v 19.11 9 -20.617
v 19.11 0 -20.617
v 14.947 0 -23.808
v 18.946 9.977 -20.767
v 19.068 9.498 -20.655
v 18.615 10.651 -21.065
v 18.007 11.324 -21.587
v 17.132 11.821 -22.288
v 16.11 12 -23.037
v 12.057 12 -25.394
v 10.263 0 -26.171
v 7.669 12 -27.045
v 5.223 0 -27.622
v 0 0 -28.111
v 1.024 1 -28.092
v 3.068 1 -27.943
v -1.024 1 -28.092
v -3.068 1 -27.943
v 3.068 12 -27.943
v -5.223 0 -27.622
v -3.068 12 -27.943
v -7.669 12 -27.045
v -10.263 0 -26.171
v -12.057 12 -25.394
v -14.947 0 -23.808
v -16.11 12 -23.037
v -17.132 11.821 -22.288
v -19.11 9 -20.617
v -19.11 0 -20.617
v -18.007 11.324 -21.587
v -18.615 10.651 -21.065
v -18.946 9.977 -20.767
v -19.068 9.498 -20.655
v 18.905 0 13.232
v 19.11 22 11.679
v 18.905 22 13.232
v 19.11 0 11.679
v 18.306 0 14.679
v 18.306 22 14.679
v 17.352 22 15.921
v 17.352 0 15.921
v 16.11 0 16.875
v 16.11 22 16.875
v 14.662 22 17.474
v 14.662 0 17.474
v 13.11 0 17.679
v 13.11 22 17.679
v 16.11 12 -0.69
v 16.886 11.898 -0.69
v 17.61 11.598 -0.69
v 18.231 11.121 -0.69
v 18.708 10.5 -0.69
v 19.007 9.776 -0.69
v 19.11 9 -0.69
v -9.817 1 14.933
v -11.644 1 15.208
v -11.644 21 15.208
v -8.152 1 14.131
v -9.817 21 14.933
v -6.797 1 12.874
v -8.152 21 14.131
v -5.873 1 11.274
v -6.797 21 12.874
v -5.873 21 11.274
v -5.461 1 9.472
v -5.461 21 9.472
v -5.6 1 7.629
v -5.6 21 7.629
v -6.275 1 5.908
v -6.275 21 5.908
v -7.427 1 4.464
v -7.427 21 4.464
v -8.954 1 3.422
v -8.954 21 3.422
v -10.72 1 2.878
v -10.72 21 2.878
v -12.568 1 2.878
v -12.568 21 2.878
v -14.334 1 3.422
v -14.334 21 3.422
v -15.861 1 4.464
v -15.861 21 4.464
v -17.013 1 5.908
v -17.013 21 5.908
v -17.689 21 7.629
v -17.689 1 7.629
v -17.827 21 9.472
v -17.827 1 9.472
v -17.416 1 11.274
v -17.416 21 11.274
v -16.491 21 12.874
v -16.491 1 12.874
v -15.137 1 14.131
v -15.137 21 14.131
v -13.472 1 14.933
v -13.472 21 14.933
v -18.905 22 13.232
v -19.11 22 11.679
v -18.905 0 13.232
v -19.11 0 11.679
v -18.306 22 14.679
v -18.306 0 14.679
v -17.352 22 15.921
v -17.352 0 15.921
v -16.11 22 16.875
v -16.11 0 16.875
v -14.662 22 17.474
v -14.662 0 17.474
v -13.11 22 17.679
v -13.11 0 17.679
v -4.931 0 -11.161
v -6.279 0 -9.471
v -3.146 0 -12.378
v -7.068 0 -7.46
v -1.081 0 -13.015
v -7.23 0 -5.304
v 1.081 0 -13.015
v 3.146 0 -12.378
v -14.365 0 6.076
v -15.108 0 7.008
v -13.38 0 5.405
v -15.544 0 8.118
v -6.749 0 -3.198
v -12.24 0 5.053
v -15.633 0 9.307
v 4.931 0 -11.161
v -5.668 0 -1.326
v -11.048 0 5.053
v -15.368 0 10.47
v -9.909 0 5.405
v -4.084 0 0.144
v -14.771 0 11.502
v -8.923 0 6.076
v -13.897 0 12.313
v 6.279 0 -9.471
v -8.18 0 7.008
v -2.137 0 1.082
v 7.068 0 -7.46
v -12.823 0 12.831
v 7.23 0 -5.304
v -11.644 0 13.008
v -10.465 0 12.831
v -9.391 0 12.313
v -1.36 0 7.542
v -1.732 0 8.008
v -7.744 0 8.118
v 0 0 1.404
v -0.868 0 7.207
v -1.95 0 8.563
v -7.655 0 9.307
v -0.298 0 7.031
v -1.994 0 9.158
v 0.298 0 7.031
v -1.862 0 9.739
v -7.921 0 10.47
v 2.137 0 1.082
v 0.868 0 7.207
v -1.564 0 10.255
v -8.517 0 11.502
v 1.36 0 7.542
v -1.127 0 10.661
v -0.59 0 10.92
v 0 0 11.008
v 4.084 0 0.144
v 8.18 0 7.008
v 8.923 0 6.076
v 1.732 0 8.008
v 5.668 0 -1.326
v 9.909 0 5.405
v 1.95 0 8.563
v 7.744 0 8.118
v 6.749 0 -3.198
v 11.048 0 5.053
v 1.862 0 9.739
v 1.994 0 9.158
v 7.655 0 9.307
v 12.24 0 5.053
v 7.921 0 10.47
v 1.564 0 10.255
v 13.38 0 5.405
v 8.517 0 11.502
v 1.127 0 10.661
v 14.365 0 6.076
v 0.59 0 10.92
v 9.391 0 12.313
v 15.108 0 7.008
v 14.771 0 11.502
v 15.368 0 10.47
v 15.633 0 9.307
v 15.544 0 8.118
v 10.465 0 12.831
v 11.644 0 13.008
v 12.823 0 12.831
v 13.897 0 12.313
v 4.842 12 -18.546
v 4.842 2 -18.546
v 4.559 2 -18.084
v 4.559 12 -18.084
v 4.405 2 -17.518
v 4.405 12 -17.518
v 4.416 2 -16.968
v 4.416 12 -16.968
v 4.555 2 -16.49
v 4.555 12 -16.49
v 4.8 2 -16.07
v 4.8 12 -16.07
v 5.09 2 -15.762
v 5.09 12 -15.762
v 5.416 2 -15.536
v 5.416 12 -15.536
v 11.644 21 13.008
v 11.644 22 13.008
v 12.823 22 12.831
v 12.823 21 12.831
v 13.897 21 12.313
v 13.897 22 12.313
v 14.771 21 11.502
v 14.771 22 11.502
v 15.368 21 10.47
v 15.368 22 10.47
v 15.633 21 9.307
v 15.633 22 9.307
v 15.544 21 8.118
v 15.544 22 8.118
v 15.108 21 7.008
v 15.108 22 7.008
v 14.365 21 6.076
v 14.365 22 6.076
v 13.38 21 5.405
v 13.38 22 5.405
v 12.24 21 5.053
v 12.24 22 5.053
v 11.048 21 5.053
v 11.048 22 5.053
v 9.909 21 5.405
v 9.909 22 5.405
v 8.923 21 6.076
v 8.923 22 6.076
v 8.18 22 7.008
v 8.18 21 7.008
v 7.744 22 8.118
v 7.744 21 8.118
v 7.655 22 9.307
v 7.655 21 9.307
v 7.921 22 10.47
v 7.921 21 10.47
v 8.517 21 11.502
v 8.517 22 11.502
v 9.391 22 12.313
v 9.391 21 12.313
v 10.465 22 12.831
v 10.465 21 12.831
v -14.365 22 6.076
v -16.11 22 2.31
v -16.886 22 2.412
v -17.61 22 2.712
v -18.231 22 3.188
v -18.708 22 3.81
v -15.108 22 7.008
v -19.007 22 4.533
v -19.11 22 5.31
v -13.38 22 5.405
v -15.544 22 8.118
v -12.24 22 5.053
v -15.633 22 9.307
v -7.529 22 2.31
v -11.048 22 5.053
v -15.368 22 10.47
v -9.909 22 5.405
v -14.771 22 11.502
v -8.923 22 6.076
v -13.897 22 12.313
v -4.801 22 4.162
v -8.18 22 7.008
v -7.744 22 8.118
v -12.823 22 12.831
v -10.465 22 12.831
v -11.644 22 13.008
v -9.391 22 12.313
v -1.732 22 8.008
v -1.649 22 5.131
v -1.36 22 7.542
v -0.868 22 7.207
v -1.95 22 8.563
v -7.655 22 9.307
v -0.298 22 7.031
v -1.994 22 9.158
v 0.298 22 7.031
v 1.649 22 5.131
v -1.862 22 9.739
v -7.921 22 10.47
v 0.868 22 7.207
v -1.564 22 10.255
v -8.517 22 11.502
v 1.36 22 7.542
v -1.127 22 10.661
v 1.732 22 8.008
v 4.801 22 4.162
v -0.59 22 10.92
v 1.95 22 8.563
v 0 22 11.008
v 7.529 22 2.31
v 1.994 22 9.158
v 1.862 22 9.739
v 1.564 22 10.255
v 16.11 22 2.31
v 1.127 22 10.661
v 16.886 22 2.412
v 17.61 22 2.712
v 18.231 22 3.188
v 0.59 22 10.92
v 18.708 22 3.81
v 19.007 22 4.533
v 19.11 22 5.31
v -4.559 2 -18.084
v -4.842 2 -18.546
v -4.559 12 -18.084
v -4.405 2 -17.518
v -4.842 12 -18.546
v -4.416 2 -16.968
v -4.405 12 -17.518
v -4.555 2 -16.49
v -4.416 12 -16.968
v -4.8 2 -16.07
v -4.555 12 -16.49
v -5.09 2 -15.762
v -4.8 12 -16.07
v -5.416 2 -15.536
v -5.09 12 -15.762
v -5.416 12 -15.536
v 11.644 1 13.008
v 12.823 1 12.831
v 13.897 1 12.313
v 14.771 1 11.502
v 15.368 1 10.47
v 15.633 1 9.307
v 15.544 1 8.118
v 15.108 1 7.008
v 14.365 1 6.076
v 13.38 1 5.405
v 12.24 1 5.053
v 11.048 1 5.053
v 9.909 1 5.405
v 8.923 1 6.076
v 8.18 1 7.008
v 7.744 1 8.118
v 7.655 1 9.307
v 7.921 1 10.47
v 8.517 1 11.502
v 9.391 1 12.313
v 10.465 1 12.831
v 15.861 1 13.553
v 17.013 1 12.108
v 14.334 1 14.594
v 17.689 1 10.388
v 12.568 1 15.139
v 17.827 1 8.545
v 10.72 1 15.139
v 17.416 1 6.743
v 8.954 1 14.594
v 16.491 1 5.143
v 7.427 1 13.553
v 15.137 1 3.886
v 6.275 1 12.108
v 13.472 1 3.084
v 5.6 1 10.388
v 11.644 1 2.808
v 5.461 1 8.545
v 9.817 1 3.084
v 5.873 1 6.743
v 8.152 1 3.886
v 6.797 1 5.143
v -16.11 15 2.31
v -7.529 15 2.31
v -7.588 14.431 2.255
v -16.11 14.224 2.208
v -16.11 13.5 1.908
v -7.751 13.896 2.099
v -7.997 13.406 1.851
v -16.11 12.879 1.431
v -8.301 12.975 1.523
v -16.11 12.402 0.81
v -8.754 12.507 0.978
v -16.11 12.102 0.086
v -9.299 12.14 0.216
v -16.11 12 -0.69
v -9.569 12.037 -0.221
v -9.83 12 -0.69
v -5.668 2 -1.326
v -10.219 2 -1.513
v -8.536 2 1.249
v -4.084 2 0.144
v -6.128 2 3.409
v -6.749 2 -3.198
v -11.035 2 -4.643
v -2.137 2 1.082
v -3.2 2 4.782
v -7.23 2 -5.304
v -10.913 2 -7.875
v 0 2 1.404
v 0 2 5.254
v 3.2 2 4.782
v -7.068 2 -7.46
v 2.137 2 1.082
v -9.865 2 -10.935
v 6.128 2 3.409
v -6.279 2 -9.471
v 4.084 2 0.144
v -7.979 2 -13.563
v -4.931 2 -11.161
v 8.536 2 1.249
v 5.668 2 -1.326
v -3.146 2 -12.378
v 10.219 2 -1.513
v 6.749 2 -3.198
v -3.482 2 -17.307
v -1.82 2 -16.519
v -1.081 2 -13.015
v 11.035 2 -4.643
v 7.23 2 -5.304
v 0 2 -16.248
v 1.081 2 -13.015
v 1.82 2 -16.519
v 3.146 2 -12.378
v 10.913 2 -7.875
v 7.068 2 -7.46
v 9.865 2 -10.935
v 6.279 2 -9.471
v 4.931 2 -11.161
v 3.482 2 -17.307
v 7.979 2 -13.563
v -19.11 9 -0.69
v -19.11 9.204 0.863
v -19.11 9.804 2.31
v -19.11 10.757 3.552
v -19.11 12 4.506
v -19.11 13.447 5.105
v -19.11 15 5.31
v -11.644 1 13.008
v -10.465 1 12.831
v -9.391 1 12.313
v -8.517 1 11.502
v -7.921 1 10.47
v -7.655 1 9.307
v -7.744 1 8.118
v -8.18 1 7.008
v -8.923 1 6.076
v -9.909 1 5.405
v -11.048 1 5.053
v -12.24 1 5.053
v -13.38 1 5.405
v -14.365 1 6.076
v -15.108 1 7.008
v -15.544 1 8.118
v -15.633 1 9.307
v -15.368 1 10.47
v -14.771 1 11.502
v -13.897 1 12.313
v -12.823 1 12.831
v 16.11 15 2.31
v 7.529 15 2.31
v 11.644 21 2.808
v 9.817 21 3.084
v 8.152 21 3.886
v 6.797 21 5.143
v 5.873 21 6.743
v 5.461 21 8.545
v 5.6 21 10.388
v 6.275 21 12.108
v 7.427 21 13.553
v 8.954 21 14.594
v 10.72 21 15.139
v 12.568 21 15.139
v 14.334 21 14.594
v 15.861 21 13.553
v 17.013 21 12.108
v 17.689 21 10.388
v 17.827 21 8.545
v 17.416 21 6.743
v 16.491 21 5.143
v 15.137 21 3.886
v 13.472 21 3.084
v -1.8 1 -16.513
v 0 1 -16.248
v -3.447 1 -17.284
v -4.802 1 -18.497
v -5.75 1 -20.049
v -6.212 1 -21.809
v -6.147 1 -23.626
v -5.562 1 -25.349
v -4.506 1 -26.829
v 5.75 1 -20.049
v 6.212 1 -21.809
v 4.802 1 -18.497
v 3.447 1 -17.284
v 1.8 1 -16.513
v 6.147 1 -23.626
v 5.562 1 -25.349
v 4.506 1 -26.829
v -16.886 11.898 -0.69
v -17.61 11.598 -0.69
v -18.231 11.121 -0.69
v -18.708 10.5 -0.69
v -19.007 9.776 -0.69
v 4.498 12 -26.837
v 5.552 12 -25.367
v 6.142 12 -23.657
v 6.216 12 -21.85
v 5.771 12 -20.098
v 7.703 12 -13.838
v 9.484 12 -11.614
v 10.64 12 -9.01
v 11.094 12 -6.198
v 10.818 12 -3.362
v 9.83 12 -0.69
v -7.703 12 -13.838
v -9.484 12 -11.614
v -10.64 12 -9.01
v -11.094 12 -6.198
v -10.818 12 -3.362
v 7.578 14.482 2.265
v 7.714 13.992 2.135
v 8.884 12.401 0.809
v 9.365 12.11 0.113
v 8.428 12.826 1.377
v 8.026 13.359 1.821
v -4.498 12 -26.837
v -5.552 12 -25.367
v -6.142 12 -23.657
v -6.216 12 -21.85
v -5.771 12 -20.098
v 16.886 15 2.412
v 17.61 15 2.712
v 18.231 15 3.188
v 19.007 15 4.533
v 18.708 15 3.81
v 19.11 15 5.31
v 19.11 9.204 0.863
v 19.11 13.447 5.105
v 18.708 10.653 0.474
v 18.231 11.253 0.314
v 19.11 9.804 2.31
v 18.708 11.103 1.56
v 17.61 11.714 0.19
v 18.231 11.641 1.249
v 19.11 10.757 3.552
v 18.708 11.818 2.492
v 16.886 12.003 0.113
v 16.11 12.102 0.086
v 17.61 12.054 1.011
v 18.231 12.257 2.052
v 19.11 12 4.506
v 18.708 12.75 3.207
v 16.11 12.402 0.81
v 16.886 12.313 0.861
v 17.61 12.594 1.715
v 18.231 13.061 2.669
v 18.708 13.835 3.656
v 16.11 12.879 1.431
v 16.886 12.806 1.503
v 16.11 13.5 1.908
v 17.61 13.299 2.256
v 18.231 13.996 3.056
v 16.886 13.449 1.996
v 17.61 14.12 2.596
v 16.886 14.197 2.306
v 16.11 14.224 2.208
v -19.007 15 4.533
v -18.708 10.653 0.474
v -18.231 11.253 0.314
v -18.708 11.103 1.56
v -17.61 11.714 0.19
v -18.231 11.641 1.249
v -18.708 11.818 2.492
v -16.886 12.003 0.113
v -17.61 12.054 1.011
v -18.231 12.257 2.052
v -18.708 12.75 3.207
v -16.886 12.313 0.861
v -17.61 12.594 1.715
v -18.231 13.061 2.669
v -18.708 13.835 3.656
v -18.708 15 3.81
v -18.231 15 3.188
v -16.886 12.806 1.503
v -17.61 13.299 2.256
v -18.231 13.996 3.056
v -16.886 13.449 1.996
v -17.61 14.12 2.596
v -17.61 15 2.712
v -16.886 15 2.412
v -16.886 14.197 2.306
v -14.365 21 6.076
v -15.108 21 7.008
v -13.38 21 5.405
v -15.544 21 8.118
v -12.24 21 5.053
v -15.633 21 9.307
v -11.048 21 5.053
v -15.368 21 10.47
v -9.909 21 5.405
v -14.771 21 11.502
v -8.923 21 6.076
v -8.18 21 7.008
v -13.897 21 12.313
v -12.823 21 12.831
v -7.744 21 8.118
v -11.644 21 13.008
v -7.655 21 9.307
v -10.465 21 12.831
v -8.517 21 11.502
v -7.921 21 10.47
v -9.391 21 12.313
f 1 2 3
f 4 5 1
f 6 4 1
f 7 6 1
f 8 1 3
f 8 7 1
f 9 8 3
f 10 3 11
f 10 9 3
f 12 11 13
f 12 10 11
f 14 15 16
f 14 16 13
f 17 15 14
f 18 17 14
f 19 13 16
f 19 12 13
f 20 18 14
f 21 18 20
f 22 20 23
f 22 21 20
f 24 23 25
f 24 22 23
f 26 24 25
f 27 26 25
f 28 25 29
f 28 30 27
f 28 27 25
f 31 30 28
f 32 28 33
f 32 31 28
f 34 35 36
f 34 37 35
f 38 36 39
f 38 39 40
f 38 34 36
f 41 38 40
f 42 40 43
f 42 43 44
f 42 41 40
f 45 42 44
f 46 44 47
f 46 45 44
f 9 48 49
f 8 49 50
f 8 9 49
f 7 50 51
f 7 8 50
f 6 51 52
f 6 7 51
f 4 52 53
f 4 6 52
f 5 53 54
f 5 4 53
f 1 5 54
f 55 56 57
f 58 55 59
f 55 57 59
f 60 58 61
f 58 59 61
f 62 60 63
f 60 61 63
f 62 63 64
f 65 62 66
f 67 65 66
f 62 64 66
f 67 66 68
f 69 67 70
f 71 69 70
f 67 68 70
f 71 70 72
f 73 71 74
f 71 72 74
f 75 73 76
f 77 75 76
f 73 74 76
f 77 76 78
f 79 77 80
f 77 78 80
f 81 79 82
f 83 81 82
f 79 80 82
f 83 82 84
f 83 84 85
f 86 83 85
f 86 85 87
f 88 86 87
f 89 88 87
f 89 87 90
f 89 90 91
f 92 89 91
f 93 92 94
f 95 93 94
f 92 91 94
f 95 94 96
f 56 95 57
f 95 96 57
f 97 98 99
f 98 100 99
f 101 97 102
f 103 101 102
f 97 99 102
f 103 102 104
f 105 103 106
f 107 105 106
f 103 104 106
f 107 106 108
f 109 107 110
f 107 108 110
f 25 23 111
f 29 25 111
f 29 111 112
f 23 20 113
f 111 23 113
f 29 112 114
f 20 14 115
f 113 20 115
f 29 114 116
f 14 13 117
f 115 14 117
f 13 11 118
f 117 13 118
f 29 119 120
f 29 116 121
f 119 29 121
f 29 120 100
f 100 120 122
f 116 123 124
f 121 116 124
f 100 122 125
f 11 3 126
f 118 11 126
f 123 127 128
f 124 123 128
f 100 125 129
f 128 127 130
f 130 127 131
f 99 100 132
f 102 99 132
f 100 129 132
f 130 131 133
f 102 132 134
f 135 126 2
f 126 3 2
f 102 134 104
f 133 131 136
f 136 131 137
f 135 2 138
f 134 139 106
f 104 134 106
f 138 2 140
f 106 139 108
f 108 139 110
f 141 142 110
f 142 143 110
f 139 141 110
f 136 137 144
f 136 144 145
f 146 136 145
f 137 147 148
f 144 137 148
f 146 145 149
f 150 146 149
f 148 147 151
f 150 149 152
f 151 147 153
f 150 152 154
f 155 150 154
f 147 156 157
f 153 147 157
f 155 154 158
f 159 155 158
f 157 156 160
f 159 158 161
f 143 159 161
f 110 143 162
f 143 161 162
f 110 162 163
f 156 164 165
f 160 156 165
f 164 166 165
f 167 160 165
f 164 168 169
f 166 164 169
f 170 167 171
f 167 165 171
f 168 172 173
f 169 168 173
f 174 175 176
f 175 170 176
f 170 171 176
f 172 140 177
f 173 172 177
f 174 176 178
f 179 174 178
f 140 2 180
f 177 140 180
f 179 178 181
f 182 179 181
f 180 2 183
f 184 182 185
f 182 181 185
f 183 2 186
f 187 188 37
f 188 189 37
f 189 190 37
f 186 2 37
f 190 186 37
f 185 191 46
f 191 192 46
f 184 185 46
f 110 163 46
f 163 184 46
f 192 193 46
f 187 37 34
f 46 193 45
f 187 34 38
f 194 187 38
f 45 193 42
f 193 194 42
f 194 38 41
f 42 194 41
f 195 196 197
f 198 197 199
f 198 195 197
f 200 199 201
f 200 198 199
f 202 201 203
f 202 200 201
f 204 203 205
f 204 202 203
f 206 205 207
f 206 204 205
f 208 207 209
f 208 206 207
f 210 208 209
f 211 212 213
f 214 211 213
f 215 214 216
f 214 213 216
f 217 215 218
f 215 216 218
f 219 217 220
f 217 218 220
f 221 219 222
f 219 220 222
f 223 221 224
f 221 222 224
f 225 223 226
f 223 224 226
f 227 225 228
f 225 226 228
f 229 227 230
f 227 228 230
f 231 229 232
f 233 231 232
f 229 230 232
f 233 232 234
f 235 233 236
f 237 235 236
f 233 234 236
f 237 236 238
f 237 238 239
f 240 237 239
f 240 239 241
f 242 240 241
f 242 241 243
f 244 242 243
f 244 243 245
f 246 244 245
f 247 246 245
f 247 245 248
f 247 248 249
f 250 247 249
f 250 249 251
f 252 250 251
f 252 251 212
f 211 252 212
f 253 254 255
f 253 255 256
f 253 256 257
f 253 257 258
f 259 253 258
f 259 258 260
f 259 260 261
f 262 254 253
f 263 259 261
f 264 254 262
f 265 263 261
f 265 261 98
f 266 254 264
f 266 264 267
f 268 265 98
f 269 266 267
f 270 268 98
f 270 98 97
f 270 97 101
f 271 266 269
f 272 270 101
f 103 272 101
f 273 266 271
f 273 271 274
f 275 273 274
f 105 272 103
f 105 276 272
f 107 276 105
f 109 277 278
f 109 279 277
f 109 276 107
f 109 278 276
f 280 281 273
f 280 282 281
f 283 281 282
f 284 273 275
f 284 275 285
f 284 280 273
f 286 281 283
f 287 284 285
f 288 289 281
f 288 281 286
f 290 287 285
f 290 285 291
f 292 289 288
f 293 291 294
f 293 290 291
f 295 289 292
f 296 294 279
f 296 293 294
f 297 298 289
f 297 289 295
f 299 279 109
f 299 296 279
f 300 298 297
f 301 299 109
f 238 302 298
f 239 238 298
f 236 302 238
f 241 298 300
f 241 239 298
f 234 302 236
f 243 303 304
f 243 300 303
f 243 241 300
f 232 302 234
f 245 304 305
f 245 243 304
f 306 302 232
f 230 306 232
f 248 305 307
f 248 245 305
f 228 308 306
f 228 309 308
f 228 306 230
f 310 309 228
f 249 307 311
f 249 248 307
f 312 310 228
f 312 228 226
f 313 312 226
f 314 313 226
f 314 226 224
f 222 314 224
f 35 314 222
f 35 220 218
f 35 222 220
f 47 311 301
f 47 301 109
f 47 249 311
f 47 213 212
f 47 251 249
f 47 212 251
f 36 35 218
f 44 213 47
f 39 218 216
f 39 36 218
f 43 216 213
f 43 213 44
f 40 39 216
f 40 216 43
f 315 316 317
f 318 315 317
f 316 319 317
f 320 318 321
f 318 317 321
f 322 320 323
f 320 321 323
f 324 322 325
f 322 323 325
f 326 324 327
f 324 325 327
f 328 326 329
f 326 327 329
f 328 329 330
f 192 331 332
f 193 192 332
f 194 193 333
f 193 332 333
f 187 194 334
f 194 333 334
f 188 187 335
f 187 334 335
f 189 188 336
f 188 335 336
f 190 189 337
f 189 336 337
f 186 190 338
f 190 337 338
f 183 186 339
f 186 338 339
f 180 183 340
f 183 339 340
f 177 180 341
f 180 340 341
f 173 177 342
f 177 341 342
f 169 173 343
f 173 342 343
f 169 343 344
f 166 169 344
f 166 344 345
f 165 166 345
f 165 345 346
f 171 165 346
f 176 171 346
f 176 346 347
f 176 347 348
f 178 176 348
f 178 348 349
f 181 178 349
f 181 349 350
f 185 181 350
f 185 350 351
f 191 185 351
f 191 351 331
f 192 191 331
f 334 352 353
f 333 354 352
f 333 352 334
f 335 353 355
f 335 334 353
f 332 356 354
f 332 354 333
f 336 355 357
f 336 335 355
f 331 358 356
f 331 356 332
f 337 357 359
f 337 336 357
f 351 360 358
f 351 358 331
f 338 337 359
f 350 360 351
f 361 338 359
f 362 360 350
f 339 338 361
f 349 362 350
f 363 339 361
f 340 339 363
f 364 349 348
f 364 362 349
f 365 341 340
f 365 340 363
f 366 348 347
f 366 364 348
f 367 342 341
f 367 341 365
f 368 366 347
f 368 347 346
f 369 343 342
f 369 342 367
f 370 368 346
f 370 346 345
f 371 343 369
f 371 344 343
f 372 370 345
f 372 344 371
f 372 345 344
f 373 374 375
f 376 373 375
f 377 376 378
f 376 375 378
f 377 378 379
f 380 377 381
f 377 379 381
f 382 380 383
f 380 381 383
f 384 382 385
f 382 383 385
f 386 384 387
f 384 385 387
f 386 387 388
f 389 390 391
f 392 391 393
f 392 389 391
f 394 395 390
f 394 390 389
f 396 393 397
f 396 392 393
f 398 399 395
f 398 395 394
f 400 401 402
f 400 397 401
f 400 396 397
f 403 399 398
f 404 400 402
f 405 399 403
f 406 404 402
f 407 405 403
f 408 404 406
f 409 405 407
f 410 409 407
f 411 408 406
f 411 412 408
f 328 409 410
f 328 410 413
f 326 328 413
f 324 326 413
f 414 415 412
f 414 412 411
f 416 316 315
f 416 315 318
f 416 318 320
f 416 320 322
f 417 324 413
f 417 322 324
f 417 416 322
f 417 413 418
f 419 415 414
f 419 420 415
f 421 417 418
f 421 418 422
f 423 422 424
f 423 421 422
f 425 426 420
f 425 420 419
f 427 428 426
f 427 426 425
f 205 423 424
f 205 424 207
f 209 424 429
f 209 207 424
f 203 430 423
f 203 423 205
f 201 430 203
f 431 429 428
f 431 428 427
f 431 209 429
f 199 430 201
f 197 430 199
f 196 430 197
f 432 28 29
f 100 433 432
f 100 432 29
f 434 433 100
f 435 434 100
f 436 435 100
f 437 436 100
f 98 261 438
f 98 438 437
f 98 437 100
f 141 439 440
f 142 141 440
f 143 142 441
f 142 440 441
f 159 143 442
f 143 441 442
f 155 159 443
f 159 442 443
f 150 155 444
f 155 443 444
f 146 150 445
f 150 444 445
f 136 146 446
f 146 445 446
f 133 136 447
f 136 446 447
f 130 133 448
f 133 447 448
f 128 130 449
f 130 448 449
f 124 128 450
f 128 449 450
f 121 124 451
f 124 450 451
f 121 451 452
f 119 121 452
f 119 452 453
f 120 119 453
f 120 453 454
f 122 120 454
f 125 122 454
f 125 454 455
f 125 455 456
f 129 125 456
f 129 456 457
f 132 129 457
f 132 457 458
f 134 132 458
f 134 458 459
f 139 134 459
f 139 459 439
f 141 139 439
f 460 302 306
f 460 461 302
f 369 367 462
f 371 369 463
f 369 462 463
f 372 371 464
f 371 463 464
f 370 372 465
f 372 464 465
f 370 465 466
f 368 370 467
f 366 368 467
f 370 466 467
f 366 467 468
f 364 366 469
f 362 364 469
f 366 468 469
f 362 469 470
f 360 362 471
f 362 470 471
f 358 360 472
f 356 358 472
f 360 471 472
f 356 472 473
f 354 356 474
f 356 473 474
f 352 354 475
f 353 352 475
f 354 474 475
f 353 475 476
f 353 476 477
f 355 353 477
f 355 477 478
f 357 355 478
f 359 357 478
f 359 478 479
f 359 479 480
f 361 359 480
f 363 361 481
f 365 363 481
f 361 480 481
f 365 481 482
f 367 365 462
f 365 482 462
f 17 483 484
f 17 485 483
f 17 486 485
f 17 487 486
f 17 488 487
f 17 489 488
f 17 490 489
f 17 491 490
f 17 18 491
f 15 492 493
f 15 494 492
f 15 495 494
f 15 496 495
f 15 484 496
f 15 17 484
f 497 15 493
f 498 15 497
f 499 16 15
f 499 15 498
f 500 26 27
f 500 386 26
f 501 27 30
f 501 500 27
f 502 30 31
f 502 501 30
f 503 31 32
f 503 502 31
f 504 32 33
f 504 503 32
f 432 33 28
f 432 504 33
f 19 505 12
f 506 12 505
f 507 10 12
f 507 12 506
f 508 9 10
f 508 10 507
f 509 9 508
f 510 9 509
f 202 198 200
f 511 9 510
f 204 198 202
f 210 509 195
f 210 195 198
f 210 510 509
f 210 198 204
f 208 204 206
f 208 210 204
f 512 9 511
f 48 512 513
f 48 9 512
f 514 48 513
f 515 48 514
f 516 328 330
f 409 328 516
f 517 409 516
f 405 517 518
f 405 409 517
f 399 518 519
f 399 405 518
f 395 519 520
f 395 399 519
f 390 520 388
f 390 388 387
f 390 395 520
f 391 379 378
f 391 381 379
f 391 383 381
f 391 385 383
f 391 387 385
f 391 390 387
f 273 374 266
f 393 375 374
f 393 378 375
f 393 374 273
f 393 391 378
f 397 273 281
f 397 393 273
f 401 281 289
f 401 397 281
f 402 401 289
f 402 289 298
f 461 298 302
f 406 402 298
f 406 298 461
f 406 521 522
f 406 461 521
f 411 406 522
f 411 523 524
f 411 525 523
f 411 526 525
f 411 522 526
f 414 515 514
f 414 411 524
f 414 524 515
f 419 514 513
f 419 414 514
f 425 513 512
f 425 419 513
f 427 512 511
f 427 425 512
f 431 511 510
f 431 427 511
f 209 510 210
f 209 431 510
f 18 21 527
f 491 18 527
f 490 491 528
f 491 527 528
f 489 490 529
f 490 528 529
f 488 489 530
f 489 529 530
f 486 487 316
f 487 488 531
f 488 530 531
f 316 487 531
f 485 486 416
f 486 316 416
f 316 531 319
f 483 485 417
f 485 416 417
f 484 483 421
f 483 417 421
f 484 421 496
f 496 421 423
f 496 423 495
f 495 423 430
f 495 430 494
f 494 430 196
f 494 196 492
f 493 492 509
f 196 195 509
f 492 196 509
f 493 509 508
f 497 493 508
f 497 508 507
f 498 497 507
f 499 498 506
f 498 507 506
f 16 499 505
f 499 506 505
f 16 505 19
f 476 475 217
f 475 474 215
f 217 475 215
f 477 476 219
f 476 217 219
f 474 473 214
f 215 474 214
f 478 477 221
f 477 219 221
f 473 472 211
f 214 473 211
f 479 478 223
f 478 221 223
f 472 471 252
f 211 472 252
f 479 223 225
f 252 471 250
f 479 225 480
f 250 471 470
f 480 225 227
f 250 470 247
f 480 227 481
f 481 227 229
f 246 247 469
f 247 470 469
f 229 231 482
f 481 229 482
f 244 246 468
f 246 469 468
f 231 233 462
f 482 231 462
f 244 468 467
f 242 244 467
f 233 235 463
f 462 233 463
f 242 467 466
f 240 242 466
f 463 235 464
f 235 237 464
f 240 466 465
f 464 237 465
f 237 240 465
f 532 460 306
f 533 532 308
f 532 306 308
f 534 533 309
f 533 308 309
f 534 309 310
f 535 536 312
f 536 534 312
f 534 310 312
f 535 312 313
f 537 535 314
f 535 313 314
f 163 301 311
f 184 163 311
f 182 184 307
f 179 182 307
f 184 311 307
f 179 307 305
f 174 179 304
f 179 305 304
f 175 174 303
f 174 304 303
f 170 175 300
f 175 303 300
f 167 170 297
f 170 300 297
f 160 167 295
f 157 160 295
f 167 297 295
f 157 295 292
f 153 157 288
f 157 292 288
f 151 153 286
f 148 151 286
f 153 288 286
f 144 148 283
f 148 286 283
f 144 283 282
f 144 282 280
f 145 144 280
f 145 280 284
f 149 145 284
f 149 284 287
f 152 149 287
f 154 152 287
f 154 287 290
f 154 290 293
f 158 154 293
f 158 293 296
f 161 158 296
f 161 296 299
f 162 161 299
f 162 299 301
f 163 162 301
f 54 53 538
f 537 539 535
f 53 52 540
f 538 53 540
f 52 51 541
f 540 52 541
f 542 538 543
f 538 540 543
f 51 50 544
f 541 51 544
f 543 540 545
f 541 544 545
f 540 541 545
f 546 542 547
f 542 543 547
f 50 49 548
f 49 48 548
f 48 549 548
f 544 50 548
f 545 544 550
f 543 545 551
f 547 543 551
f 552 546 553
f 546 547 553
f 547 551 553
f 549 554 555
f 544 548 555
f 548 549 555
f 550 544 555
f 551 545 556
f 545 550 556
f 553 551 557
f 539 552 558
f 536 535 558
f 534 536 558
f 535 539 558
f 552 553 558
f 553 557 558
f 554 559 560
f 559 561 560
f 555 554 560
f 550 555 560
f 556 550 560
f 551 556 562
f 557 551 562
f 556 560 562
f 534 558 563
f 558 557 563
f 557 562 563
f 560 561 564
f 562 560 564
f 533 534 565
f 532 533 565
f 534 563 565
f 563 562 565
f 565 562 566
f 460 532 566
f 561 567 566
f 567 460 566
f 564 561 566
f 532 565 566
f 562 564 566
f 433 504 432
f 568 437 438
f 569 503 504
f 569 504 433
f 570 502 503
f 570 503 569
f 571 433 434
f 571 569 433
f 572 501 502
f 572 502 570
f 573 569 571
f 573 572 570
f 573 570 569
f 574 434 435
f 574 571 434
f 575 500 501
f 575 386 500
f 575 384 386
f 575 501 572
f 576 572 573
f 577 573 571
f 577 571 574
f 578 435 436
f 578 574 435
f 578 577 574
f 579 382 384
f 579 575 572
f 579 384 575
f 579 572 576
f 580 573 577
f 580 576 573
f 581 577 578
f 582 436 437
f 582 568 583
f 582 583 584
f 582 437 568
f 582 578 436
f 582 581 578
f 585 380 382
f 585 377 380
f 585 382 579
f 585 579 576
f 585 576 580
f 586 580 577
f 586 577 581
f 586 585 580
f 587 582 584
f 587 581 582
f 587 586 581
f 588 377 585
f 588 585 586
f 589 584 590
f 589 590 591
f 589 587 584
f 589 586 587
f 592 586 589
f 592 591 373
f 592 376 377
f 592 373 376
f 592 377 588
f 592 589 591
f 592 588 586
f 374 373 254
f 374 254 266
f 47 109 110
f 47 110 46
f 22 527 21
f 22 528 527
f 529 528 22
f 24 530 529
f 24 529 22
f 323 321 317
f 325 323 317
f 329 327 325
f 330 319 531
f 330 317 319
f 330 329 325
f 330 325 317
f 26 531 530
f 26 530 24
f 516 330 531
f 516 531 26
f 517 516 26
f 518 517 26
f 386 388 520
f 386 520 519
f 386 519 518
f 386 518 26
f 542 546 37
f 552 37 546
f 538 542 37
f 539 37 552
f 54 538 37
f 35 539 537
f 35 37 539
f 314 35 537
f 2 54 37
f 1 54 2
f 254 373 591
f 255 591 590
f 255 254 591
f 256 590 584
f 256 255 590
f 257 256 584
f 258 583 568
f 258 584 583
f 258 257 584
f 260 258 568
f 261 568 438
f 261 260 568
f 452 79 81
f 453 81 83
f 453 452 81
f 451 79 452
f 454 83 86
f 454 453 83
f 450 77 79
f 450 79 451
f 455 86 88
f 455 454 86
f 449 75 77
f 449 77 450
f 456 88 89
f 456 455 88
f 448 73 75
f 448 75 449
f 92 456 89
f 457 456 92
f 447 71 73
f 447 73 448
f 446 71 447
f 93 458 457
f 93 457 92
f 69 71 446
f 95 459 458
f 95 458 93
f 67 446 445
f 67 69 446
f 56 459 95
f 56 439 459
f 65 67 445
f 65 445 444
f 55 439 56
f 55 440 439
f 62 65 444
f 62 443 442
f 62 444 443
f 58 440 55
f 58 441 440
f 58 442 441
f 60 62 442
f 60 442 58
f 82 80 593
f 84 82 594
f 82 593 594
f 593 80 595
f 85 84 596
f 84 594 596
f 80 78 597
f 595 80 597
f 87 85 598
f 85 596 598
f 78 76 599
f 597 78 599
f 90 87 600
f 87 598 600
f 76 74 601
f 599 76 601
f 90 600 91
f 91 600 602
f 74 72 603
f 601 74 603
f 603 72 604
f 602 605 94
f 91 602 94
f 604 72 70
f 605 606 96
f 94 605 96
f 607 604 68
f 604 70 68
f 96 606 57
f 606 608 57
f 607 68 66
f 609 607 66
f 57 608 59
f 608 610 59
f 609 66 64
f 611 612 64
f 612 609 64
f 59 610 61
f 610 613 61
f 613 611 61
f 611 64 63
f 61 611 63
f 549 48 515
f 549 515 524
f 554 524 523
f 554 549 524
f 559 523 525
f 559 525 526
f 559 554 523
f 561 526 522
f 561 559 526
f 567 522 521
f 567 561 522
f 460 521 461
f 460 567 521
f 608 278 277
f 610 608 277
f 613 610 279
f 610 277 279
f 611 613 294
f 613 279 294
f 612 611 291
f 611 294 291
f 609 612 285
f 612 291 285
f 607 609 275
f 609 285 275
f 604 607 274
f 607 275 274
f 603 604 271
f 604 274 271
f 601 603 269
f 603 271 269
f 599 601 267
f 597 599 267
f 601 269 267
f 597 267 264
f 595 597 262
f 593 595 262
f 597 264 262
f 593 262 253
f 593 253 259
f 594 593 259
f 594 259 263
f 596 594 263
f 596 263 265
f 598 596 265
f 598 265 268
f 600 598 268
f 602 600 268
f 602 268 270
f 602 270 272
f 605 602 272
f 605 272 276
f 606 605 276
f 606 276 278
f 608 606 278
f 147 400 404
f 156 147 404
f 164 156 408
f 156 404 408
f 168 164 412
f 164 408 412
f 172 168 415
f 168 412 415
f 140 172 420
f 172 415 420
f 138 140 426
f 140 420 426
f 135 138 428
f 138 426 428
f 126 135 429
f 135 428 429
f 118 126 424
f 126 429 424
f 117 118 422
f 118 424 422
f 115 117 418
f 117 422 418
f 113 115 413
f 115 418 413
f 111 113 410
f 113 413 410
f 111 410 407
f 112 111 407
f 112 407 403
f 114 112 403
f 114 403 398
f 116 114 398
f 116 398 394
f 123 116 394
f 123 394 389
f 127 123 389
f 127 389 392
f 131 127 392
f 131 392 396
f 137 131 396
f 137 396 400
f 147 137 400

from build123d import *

# Parameters (mm, degrees)
SKETCH1_R                = 34.445
BOSS_EXTRUDE1_DEPTH      = 22
SKETCH15_R               = 34.445
CUT_EXTRUDE2_DEPTH       = 54.450126754
CUT_EXTRUDE4_START       = -1
SKETCH17_R               = 6.2
CUT_EXTRUDE4_DEPTH       = 20
SKETCH18_R               = 7.25
CUT_EXTRUDE5_DEPTH       = 41.489614217
SKETCH19_R               = 6.25
CUT_EXTRUDE7_DEPTH       = 21
SKETCH20_R               = 9.845995641
CUT_EXTRUDE9_DEPTH       = 10
FILLET12_R               = 6
SKETCH23_R               = 4
SKETCH23_R_2             = 2
CUT_EXTRUDE10_DEPTH      = 41.489614217
CUT_EXTRUDE11_START      = -12
CUT_EXTRUDE11_DEPTH      = 29.489614217
FILLET19_R               = 3
CUT_EXTRUDE12_DEPTH      = 10
CUT_EXTRUDE12_DEPTH_BACK = 10
SKETCH25_R               = 11.1
FILLET20_R               = 2


with BuildPart() as part:
    # Sketch1 → Boss-Extrude1 (new body)
    with BuildSketch(Plane(origin=(0, 0, 0), x_dir=(1, 0, 0), z_dir=(0, 1, 0))):
        with Locations(Location((0, 0, 0), (0, 0, 270))):
            Circle(SKETCH1_R)
    extrude(amount=BOSS_EXTRUDE1_DEPTH)

    # Sketch15 → Cut-Extrude2 (cut, through all)
    with BuildSketch(Plane(origin=(0, 22, 0), x_dir=(1, 0, 0), z_dir=(0, 1, 0))):
        Circle(SKETCH15_R)
        with BuildLine():
            Line((-19.109582045, 20.616901016), (-19.109582045, -17.678671312))
            Line((-19.109582045, -17.678671312), (19.109582045, -17.678671312))
            Line((19.109582045, -17.678671312), (19.109582045, 20.616901016))
            ThreePointArc((19.109582045, 20.616901016), (0, 28.111078483), (-19.109582045, 20.616901016))
        make_face(mode=Mode.SUBTRACT)
    extrude(amount=-CUT_EXTRUDE2_DEPTH, mode=Mode.SUBTRACT)

    # Sketch17 → Cut-Extrude4 (cut)
    with BuildSketch(Plane(origin=(0, 22, 0), x_dir=(1, 0, 0), z_dir=(0, 1, 0)).offset(CUT_EXTRUDE4_START)):
        with Locations(Location((-11.644122412, -9.008465082, 0), (0, 0, 270))):
            Circle(SKETCH17_R)
        with Locations(Location((11.644122412, -9.008465082, 0), (0, 0, 90))):
            Circle(SKETCH17_R)
    extrude(amount=-CUT_EXTRUDE4_DEPTH, mode=Mode.SUBTRACT)

    # Sketch18 → Cut-Extrude5 (cut, through all)
    with BuildSketch(Plane(origin=(0, 22, 0), x_dir=(1, 0, 0), z_dir=(0, 1, 0))):
        with Locations(Location((0, 5.846291401, 0), (0, 0, 270))):
            Circle(SKETCH18_R)
    extrude(amount=-CUT_EXTRUDE5_DEPTH, mode=Mode.SUBTRACT)

    # Sketch19 → Cut-Extrude7 (cut)
    with BuildSketch(Plane(origin=(0, 22, 0), x_dir=(1, 0, 0), z_dir=(0, 1, 0))):
        with Locations((0, 22.497935332)):
            Circle(SKETCH19_R)
    extrude(amount=-CUT_EXTRUDE7_DEPTH, mode=Mode.SUBTRACT)

    # Sketch20 → Cut-Extrude9 (cut)
    with BuildSketch(Plane(origin=(0, 22, 0), x_dir=(1, 0, 0), z_dir=(0, 1, 0))):
        with Locations(Location((0, 5.846291401, 0), (0, 0, 270))):
            Circle(SKETCH20_R)
    extrude(amount=-CUT_EXTRUDE9_DEPTH, mode=Mode.SUBTRACT)

    # Fillet12
    fillet12_edges = [part.edges().sort_by_distance(p)[0] for p in [
        (-19.109582045, 11, 17.678671312),
        (19.109582045, 11, 17.678671312),
    ]]
    fillet(fillet12_edges, radius=FILLET12_R)

    # Sketch23 → Cut-Extrude10 (cut, through all)
    with BuildSketch(Plane(origin=(0, 22, 0), x_dir=(1, 0, 0), z_dir=(0, 1, 0))):
        with Locations(Location((-11.644122412, -9.008465082, 0), (0, 0, 270))):
            Circle(SKETCH23_R)
        with Locations(Location((11.644122412, -9.008465082, 0), (0, 0, 270))):
            Circle(SKETCH23_R)
        with Locations(Location((0, -9.008465082, 0), (0, 0, 270))):
            Circle(SKETCH23_R_2)
    extrude(amount=-CUT_EXTRUDE10_DEPTH, mode=Mode.SUBTRACT)

    # Sketch24 → Cut-Extrude11 (cut, through all)
    with BuildSketch(Plane.XZ.offset(CUT_EXTRUDE11_START)):
        with BuildLine():
            Line((-19.109582045, -20.616901016), (-19.109582045, 2.30978602))
            Line((-19.109582045, 2.30978602), (19.109582045, 2.30978602))
            Line((19.109582045, 2.30978602), (19.109582045, -20.616901016))
            ThreePointArc((19.109582045, -20.616901016), (0, -28.111078483), (-19.109582045, -20.616901016))
        make_face()
    extrude(amount=-CUT_EXTRUDE11_DEPTH, mode=Mode.SUBTRACT)

    # Fillet19
    fillet19_edges = [part.edges().sort_by_distance(p)[0] for p in [
        (-19.109582045, 17, 2.30978602),
        (12.31259954, 12, 2.30978602),
        (-12.31259954, 12, 2.30978602),
        (-19.109582045, 12, -9.153557498),
        (19.109582045, 12, -9.153557498),
        (19.109582045, 17, 2.30978602),
    ]]
    fillet(fillet19_edges, radius=FILLET19_R)

    # Sketch25 → Cut-Extrude12 (cut, two sides: drawn at the far end of the back side and taken through both)
    with BuildSketch(Plane(origin=(0, 12, 0), x_dir=(1, 0, 0), z_dir=(0, 1, 0)).offset(-CUT_EXTRUDE12_DEPTH_BACK)):
        with Locations((0, 5.846291401)):
            Circle(SKETCH25_R)
    extrude(amount=CUT_EXTRUDE12_DEPTH + CUT_EXTRUDE12_DEPTH_BACK, mode=Mode.SUBTRACT)

    # Fillet20
    fillet20_edges = [part.edges().sort_by_distance(p)[0] for p in [
        (-2.330818134, 7, -16.698815845),
        (2.330818134, 7, -16.698815845),
    ]]
    fillet(fillet20_edges, radius=FILLET20_R)


solid = part.part
